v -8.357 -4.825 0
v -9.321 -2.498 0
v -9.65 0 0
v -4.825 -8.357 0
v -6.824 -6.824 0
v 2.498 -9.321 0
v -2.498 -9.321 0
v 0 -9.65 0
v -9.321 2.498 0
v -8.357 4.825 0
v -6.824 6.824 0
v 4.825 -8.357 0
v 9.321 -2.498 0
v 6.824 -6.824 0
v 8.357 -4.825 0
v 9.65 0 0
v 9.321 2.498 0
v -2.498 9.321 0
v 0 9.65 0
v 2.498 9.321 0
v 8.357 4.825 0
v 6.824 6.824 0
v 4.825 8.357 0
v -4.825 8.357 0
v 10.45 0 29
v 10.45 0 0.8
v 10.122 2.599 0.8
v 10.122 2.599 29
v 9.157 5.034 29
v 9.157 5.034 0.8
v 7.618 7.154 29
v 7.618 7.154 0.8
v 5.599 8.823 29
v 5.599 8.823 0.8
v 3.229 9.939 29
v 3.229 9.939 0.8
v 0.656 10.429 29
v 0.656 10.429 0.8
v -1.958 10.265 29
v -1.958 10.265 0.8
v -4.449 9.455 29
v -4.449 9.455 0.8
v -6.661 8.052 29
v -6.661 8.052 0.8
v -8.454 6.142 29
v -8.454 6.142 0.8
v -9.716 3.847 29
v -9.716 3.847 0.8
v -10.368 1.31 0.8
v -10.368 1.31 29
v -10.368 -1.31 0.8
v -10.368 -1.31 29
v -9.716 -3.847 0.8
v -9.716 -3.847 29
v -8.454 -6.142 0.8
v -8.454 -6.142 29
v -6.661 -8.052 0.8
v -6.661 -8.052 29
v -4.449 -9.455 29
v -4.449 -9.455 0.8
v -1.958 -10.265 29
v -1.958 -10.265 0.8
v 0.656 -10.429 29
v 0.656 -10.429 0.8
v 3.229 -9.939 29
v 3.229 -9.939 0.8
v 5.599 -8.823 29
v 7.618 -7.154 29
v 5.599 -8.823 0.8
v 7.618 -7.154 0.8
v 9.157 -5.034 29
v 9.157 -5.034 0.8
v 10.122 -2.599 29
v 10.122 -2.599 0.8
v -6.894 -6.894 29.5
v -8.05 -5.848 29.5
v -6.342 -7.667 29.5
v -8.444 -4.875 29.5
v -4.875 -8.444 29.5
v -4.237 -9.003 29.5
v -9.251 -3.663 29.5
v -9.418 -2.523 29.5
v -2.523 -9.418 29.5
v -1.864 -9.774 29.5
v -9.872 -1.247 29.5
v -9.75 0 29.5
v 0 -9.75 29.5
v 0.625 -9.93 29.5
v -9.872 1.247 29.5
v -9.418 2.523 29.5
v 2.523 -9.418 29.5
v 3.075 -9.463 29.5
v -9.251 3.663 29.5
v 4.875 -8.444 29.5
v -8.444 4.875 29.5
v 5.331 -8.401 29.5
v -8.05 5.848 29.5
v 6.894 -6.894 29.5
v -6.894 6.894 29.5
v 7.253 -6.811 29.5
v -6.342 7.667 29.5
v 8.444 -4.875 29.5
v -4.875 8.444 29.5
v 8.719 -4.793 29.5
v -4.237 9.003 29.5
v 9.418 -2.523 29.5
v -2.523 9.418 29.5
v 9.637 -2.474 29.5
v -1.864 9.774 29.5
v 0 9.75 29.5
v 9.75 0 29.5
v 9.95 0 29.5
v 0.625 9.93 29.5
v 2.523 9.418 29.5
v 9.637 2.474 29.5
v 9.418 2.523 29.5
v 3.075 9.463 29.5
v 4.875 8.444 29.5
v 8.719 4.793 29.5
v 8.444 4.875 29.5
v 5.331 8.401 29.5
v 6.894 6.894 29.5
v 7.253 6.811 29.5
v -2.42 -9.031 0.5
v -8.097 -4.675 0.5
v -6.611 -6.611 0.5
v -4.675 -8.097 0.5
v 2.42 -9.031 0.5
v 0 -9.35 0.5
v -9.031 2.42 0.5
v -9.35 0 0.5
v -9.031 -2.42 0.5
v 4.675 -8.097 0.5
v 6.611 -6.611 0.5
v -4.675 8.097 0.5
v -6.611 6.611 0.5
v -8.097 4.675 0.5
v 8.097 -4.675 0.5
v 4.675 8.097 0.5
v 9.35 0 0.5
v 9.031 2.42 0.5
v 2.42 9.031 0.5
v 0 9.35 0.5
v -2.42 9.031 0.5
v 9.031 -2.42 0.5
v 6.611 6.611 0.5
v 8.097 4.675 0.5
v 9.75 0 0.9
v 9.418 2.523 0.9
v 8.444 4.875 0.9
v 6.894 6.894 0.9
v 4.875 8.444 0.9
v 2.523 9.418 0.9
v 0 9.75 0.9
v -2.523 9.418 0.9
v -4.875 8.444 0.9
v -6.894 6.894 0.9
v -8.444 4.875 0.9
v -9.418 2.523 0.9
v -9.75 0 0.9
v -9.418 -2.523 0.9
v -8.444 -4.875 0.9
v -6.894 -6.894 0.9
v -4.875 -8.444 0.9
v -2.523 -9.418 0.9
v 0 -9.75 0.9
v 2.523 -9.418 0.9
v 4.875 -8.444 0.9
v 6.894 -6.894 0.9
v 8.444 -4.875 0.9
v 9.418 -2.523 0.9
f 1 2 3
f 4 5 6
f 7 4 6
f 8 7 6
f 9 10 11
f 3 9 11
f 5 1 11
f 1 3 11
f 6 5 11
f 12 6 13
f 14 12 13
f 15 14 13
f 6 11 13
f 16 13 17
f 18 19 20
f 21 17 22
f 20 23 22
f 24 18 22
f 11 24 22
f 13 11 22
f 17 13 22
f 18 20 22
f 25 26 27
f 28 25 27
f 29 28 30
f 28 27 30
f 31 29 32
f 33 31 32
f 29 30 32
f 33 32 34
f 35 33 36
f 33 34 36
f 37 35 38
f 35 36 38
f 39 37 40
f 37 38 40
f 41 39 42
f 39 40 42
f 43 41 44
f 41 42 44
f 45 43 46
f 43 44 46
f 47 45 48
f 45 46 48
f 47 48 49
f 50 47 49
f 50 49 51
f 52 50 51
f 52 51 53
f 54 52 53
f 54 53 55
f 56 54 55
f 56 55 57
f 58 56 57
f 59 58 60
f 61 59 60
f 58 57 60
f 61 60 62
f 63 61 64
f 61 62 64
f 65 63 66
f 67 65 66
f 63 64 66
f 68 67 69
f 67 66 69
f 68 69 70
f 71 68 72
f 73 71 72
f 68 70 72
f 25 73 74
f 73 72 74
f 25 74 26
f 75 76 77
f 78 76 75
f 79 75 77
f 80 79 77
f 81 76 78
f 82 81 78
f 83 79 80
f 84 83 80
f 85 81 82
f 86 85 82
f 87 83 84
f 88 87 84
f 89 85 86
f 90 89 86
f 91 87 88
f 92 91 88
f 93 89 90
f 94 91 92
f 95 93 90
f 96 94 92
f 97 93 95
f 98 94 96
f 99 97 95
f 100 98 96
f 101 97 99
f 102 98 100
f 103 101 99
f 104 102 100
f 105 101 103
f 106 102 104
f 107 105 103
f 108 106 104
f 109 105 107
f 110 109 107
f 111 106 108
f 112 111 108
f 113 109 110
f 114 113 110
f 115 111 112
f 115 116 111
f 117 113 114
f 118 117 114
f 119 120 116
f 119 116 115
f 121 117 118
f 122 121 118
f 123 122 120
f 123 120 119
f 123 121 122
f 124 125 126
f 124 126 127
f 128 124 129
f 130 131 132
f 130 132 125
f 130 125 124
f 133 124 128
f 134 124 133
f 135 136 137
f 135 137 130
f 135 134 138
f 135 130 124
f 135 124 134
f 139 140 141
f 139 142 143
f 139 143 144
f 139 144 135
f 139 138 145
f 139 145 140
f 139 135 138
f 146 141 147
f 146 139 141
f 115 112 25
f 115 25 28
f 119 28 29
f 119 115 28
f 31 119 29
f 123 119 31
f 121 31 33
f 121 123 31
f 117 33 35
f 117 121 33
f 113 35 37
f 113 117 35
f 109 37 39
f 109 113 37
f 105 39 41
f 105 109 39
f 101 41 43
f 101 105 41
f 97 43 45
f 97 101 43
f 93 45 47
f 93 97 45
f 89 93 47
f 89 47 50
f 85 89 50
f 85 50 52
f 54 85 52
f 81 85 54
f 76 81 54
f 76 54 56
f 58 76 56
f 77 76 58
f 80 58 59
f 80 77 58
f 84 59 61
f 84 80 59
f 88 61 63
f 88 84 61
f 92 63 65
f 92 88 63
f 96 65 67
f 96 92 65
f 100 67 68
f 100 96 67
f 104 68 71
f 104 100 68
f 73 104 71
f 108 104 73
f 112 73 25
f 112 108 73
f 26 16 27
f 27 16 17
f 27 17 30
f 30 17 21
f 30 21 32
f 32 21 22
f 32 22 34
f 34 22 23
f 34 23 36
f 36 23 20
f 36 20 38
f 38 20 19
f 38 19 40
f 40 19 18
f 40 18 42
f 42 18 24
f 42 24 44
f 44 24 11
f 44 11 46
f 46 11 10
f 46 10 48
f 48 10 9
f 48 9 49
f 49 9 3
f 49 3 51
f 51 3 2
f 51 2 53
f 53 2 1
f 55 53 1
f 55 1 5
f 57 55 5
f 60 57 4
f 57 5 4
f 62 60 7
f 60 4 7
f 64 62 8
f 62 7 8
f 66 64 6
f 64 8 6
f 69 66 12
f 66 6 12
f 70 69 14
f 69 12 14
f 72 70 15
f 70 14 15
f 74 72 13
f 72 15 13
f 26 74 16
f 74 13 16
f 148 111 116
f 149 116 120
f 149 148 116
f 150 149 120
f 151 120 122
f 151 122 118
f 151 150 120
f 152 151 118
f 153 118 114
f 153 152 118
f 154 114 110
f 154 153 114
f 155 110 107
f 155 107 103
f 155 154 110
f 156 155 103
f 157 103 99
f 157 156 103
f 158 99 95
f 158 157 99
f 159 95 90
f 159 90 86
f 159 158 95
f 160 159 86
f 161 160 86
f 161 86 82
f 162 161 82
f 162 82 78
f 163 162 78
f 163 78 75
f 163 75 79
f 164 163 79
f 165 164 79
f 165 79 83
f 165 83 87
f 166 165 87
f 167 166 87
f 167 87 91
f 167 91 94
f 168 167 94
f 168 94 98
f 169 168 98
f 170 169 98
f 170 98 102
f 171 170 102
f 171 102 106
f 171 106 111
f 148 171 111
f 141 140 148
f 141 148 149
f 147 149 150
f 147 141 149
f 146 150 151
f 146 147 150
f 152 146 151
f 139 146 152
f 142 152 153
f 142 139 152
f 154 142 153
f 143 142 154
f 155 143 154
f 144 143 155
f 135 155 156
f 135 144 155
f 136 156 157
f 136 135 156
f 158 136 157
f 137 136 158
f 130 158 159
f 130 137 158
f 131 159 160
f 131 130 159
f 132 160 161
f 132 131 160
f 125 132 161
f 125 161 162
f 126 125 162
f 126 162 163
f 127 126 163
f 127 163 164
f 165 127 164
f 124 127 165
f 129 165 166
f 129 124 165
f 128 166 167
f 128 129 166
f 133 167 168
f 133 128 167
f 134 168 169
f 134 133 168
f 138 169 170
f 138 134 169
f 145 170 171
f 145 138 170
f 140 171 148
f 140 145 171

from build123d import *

# Parameters (mm, degrees)
F0_R     = 9.75
F1_DEPTH = 0.5
F0_R_2   = 10.45
F2_DEPTH = 29.5
F3_SIZE  = 0.5
F4_SIZE  = 0.4
F5_SIZE  = 0.8


with BuildPart() as f1:
    # F0 (on Top) → F1 (new body)
    with BuildSketch(Plane.XY):
        Circle(F0_R)
    extrude(amount=F1_DEPTH)

    # F0 (on Top) → F2 (join)
    with BuildSketch(Plane.XY):
        Circle(F0_R_2)
        Circle(F0_R, mode=Mode.SUBTRACT)
    extrude(amount=F2_DEPTH)

    # F3
    f3_edges = [f1.edges().sort_by_distance(p)[0] for p in [
        (-10.45, 0, 29.5),
    ]]
    chamfer(f3_edges, length=F3_SIZE)

    # F4
    f4_edges = [f1.edges().sort_by_distance(p)[0] for p in [
        (-9.75, 0, 0.5),
    ]]
    chamfer(f4_edges, length=F4_SIZE)

    # F5
    f5_edges = [f1.edges().sort_by_distance(p)[0] for p in [
        (-10.45, 0, 0),
    ]]
    chamfer(f5_edges, length=F5_SIZE)


solid = f1.part
